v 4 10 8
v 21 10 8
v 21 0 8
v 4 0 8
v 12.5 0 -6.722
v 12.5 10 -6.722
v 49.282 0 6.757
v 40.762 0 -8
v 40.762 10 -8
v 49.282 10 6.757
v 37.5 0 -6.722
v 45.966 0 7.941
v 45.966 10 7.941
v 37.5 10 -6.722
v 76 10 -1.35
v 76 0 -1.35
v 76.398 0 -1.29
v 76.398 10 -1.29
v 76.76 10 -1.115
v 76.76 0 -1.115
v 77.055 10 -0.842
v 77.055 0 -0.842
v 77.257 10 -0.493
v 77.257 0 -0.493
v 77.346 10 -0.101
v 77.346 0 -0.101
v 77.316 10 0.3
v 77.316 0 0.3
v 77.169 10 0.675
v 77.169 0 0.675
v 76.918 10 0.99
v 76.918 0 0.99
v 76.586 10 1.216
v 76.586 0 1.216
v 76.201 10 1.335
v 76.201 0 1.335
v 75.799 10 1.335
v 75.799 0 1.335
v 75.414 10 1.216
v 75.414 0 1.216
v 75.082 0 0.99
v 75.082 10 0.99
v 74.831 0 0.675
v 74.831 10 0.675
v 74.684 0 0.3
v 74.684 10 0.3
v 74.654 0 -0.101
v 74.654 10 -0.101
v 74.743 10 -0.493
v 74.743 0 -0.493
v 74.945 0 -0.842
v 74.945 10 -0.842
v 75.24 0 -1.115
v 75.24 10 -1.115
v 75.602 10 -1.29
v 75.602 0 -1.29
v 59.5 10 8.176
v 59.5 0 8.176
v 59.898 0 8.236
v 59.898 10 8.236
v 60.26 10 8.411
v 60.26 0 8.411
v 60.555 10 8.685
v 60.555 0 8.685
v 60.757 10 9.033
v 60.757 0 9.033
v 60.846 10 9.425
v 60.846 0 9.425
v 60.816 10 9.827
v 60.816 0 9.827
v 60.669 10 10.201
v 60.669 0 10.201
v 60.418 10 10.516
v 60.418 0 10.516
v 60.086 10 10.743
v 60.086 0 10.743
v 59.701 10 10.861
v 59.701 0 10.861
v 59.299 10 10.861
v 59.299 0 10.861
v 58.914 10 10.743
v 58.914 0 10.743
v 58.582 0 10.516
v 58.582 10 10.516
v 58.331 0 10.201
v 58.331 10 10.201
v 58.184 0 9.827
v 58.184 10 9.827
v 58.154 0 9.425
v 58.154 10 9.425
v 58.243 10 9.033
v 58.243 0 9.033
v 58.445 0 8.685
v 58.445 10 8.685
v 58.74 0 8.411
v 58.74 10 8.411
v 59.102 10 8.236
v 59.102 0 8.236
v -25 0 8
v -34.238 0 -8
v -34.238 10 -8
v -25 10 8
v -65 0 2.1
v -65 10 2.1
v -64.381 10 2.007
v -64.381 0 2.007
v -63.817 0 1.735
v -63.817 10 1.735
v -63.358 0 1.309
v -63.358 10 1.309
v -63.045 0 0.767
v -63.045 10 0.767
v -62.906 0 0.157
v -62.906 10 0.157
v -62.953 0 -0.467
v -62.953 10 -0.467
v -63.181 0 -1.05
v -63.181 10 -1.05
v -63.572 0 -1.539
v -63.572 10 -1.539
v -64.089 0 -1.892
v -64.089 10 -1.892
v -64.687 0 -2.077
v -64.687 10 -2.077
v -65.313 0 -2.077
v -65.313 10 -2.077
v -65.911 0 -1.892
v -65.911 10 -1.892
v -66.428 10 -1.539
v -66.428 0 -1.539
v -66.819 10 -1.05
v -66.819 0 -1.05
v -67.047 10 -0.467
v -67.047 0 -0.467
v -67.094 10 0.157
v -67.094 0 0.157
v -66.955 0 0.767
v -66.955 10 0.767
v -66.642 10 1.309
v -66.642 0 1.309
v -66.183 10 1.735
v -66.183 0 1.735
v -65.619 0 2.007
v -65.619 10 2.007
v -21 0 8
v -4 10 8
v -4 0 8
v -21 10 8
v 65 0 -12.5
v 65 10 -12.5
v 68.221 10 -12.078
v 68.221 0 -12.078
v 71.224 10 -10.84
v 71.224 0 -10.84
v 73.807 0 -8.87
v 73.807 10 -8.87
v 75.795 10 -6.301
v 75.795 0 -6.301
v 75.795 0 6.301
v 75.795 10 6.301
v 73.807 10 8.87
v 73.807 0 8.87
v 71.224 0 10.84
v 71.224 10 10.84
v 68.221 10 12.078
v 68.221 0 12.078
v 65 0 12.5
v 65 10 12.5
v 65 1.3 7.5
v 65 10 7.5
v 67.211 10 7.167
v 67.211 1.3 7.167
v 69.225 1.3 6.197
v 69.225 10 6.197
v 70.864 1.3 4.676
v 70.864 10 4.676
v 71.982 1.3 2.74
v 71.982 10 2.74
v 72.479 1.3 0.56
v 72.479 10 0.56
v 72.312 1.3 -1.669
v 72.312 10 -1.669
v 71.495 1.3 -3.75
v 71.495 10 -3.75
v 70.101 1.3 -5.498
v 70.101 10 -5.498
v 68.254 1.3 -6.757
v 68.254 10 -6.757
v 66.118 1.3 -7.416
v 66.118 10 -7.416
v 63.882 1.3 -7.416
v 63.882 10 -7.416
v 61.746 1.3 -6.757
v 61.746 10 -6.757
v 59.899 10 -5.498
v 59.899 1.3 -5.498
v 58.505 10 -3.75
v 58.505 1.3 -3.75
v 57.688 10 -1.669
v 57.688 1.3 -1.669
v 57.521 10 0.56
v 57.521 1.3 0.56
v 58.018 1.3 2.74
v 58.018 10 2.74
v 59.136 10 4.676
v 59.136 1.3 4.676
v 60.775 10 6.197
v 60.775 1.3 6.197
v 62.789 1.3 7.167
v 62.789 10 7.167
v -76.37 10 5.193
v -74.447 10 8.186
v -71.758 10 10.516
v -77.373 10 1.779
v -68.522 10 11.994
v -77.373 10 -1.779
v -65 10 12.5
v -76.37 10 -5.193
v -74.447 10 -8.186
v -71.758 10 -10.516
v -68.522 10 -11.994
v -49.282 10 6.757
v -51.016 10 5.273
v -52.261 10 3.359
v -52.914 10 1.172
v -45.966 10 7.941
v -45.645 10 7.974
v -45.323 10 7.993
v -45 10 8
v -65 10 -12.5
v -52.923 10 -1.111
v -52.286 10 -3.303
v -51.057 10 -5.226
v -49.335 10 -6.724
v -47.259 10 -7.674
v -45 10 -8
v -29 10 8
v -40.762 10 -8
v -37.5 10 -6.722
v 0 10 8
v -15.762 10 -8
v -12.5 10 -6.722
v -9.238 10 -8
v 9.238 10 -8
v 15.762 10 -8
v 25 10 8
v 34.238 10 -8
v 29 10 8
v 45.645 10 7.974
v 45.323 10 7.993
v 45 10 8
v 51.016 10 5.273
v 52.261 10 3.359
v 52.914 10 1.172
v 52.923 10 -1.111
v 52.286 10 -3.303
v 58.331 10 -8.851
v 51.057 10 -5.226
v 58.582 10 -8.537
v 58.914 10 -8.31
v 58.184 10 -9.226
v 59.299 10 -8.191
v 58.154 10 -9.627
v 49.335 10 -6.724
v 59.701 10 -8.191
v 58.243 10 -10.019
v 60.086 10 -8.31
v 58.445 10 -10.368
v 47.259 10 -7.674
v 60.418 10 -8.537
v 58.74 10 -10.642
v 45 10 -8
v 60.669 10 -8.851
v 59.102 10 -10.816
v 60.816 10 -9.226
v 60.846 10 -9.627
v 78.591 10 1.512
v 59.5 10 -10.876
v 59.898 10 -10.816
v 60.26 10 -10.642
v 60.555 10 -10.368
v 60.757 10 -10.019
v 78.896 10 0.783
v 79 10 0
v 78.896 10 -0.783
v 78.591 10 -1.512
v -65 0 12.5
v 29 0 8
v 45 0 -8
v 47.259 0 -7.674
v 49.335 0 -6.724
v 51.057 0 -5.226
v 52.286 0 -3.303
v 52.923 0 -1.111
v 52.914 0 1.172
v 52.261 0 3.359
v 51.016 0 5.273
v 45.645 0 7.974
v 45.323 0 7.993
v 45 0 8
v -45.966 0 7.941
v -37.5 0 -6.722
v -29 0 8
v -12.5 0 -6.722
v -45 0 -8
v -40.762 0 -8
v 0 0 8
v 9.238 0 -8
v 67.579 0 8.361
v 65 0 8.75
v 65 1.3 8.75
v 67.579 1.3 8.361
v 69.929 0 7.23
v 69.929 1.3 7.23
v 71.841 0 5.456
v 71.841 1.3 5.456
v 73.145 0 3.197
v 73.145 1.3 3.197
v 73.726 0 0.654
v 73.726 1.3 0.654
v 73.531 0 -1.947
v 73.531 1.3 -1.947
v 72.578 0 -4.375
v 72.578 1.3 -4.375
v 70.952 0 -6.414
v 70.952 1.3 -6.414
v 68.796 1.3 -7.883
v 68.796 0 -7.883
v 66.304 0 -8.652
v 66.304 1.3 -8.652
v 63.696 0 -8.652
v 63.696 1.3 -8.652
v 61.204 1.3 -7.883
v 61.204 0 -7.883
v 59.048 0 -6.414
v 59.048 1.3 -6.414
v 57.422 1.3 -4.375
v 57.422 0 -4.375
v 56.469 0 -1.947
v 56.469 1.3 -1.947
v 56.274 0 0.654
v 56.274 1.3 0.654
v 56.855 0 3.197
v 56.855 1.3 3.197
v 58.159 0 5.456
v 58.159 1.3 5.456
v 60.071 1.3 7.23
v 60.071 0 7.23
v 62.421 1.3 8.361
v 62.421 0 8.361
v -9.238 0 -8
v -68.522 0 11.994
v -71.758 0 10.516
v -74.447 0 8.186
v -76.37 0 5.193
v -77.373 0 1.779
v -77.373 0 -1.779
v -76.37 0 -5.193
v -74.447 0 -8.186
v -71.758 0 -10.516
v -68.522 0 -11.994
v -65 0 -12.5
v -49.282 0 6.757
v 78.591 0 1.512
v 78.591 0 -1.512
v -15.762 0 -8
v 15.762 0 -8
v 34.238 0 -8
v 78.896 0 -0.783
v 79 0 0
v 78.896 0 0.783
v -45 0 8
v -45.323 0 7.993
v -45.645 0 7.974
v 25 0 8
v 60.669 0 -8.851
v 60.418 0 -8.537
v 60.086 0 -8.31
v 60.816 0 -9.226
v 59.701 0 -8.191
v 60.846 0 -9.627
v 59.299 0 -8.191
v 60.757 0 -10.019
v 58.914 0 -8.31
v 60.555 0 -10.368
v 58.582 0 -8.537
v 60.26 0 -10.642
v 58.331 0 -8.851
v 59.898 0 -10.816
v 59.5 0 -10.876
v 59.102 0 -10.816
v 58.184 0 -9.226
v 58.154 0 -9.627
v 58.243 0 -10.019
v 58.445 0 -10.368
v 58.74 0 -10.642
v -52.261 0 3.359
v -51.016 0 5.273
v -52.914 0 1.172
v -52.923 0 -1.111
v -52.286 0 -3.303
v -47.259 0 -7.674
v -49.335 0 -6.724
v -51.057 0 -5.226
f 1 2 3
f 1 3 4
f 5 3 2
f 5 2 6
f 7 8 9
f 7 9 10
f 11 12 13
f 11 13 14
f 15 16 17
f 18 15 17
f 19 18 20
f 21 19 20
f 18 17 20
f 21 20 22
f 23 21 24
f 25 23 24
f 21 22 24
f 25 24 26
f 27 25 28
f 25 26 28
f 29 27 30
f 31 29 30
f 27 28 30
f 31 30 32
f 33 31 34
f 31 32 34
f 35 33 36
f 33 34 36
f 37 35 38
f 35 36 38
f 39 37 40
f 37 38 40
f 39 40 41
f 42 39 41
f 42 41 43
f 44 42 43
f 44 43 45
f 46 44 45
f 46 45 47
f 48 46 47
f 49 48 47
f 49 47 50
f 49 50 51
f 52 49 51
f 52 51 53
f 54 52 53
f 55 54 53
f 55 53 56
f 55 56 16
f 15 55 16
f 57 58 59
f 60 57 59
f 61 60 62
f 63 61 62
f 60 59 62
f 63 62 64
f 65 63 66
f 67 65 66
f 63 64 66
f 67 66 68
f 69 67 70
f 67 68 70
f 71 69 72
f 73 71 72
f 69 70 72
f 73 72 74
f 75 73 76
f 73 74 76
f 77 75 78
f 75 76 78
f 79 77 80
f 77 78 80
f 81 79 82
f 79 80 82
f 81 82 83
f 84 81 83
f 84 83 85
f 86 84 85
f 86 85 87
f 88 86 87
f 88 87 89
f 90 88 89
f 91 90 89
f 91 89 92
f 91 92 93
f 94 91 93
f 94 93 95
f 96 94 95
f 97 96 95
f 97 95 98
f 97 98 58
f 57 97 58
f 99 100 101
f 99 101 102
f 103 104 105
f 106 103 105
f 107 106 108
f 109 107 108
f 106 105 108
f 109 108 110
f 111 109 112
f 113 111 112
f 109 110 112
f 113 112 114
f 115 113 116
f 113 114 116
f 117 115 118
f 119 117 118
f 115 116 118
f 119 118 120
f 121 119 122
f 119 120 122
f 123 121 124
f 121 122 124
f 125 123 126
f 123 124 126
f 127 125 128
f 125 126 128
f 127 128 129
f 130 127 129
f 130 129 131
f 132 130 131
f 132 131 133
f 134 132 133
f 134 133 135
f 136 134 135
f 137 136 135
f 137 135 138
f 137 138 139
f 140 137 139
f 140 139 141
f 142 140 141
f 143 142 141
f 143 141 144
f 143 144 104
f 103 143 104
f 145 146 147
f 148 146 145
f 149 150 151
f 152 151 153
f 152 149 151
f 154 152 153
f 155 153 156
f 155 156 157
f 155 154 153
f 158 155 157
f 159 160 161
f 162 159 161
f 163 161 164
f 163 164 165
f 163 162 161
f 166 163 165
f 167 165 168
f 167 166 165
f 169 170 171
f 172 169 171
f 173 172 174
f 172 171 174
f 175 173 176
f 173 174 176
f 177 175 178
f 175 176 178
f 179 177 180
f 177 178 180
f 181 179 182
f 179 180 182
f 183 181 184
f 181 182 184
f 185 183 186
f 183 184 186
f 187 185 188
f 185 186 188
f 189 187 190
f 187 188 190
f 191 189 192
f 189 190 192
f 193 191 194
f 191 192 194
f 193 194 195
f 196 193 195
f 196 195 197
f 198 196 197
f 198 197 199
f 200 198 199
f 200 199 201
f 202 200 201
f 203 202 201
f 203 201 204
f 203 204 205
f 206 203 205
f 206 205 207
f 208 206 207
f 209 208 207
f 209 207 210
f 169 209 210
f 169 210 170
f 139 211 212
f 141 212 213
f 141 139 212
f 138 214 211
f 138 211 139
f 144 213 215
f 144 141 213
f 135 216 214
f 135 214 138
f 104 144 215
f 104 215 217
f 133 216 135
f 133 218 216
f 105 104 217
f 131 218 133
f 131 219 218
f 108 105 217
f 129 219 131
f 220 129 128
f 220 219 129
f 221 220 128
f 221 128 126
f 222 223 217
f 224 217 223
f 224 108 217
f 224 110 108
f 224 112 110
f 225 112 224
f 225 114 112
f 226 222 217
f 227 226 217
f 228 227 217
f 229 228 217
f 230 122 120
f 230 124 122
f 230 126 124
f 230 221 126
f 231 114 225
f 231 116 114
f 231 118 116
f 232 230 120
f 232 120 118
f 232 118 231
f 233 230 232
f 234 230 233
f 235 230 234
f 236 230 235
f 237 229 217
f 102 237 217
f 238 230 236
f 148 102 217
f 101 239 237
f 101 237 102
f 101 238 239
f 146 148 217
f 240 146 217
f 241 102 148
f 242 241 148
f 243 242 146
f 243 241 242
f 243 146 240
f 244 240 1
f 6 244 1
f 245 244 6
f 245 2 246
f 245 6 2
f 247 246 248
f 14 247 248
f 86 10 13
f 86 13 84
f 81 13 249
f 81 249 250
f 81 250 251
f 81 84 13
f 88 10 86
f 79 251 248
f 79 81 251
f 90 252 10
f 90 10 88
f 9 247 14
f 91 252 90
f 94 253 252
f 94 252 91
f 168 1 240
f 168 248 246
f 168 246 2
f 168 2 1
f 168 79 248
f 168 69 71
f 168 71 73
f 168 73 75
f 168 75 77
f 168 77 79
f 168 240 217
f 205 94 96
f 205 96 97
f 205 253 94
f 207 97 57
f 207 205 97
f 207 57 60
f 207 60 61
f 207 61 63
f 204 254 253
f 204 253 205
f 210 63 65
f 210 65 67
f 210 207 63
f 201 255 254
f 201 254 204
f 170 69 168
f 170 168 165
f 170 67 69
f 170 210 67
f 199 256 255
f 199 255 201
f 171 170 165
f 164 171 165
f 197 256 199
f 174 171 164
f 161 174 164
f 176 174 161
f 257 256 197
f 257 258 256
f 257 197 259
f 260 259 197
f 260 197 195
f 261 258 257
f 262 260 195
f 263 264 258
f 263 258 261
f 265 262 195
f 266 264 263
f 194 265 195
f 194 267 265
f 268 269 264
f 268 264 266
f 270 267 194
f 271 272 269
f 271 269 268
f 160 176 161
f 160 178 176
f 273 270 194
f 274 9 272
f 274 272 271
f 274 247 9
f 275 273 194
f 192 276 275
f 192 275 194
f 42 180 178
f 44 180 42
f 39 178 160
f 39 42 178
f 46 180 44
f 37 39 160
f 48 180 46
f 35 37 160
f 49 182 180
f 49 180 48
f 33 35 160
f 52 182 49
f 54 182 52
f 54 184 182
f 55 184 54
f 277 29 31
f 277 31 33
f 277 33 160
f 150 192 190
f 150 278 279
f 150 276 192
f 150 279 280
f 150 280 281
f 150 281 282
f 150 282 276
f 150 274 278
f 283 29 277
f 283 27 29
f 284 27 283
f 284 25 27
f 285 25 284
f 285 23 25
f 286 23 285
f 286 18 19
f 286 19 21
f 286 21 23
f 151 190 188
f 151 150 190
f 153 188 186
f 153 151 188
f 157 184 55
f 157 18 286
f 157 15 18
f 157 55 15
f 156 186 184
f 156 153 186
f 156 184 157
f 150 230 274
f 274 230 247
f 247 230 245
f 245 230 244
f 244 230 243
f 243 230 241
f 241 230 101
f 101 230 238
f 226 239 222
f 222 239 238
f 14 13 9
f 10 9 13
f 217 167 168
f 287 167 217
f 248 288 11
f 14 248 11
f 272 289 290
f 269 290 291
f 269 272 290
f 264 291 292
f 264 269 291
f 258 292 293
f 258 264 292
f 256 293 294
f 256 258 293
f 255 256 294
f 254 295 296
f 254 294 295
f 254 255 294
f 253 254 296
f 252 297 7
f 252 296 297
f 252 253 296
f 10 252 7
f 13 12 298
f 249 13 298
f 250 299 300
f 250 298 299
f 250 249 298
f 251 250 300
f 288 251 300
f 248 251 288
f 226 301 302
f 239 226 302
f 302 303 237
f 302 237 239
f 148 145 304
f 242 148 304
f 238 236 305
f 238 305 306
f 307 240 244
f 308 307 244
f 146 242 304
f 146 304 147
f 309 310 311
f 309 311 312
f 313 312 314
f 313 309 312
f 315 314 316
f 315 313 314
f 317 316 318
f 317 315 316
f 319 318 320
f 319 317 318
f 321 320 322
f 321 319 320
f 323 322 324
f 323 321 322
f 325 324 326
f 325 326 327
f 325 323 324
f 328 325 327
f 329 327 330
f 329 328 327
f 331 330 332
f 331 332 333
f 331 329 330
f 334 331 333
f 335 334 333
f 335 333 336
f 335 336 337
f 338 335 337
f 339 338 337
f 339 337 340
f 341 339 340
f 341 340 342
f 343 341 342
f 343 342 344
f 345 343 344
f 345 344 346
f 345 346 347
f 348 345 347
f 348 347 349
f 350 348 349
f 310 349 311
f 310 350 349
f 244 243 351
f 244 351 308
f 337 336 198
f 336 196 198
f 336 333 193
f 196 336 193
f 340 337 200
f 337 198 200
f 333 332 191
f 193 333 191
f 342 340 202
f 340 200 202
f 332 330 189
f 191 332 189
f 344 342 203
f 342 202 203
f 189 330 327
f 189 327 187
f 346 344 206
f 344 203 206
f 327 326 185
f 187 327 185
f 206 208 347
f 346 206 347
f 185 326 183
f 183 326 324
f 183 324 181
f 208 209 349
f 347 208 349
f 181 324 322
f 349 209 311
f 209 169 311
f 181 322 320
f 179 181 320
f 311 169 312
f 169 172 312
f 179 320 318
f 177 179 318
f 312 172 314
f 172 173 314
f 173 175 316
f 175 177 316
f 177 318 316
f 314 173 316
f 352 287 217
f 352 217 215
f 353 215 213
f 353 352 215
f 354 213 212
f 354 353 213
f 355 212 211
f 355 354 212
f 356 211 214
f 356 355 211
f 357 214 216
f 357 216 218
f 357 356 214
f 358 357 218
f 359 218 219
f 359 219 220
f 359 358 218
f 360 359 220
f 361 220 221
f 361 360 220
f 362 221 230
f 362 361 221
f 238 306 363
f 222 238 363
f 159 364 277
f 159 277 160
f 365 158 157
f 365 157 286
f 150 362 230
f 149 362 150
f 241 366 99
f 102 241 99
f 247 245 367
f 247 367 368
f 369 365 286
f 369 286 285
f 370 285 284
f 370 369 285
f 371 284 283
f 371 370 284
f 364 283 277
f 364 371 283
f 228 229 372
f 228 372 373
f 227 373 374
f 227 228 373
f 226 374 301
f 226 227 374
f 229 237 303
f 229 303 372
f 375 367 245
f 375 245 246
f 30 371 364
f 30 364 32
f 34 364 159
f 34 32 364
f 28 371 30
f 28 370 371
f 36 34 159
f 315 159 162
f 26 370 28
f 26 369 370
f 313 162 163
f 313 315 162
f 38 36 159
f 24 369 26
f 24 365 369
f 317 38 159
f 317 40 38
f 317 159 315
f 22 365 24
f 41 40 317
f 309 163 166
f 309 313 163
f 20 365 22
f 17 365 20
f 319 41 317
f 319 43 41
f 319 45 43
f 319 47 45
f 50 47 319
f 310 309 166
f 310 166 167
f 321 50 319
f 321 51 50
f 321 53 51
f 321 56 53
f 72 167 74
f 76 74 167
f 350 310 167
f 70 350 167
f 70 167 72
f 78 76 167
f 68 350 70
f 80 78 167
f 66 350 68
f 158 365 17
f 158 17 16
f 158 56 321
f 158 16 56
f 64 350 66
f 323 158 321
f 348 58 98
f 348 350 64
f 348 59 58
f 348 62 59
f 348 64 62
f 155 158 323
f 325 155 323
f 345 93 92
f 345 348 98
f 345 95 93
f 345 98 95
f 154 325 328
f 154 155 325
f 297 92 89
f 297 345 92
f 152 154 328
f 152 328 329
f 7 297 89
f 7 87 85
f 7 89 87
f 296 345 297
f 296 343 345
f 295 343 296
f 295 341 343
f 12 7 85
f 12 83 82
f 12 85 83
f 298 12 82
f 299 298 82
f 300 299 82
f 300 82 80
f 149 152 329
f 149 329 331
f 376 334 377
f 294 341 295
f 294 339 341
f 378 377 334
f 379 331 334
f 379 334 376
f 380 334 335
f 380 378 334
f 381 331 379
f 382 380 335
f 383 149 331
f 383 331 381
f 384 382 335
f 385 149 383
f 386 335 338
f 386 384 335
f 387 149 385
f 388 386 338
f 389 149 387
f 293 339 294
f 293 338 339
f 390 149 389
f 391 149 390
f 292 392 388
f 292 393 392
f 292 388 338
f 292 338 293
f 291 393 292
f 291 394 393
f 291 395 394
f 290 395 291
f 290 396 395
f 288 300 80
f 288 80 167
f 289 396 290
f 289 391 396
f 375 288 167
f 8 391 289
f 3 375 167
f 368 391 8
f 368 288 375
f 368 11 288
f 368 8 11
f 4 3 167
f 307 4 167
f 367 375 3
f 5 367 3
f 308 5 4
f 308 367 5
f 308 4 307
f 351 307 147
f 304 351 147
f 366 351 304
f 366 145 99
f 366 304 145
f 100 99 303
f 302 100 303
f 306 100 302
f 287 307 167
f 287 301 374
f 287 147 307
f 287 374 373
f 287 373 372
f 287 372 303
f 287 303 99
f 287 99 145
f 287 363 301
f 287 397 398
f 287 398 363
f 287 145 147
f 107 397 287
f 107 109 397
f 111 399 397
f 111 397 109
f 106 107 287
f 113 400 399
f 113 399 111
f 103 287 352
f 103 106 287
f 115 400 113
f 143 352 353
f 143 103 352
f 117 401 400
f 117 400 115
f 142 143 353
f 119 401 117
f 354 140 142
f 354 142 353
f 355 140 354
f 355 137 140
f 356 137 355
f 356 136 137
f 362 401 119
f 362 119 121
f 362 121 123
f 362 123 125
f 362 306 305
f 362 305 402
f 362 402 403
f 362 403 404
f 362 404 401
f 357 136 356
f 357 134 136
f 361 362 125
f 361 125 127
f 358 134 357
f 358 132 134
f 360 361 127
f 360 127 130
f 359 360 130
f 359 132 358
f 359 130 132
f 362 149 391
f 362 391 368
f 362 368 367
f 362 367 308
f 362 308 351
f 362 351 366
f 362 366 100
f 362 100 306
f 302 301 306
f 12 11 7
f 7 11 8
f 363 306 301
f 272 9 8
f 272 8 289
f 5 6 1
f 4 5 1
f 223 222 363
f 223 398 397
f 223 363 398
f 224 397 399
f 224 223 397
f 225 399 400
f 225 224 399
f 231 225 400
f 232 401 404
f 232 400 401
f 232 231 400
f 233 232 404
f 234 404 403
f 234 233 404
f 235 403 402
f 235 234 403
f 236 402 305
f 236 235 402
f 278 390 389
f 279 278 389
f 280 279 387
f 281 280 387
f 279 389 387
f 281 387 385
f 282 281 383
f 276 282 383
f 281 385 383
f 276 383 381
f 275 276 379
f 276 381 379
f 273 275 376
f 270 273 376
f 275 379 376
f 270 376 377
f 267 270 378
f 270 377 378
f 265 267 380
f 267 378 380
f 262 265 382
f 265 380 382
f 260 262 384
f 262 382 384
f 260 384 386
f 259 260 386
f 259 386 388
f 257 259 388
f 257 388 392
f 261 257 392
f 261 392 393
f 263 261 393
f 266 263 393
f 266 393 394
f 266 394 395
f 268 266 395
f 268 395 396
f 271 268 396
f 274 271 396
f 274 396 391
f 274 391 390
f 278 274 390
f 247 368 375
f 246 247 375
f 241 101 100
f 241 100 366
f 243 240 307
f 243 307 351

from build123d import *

# Parameters (mm, degrees)
EXTRUDE_1_DEPTH        = 10
EXTRUDE_5_DEPTH        = 10
CUT_EXTRUDE_2_REACH    = 82.606
SKETCH_7_R             = 7.5
SKETCH_8_R             = 8.75
CUT_EXTRUDE_3_DEPTH    = 1.3
CUT_EXTRUDE_4_REACH    = 82.606
SKETCH_9_R             = 1.35
CUT_EXTRUDE_5_REACH    = 82.606
SKETCH_12_R            = 2.1
CUT_EXTRUDE_6_REACH    = 82.606
EXTRUDE_6_DEPTH        = 10
PATTERN_LINEAR_1_DEPTH = 10


# Read off the part's stored shape, not the designer's step: 阵列(线性)1
with BuildPart() as part:
    # 草图1 → 凸台-拉伸1 (new body)
    with BuildSketch(Plane(origin=(0, 0, 0), x_dir=(1, 0, 0), z_dir=(0, 1, 0))):
        with BuildLine():
            Line((-65, 12.5), (65, 12.5))
            ThreePointArc((65, 12.5), (77.5, 0), (65, -12.5))
            Line((65, -12.5), (-65, -12.5))
            ThreePointArc((-65, -12.5), (-77.5, 0), (-65, 12.5))
        make_face()
    extrude(amount=EXTRUDE_1_DEPTH)

    # 草图10 → 凸台-拉伸5 (add)
    with BuildSketch(Plane.XZ):
        with BuildLine():
            Line((75.795454545, -6.301441197), (78.590909091, -1.512345887))
            ThreePointArc((78.590909091, -1.512345887), (79, 0), (78.590909091, 1.512345887))
            Line((78.590909091, 1.512345887), (75.795454545, 6.301441197))
            Line((75.795454545, 6.301441197), (75.795454545, -6.301441197))
        make_face()
    extrude(amount=-EXTRUDE_5_DEPTH)

    # 草图7 → 切除-拉伸2 (cut, up to next)
    with BuildSketch(Plane(origin=(0, 10, 0), x_dir=(1, 0, 0), z_dir=(0, 1, 0)), mode=Mode.PRIVATE) as cut_extrude_2_sk1:
        with Locations(Location((65, 0, 0), (0, 0, 270))):
            Circle(SKETCH_7_R)
    cut_extrude_2_tool1 = extrude(cut_extrude_2_sk1.sketch, amount=-CUT_EXTRUDE_2_REACH, mode=Mode.PRIVATE) & part.part
    add(cut_extrude_2_tool1.solids().sort_by_distance((65, 10, 0))[0], mode=Mode.SUBTRACT)

    # 草图8 → 切除-拉伸3 (cut)
    with BuildSketch(Plane(origin=(0, 0, 0), x_dir=(1, 0, 0), z_dir=(0, 1, 0))):
        with Locations(Location((65, 0, 0), (0, 0, 270))):
            Circle(SKETCH_8_R)
    extrude(amount=CUT_EXTRUDE_3_DEPTH, mode=Mode.SUBTRACT)

    # 草图9 → 切除-拉伸4 (cut, up to next)
    with BuildSketch(Plane.XZ, mode=Mode.PRIVATE) as cut_extrude_4_sk1:
        with Locations(Location((59.5, 9.526279442, 0), (0, 0, 270))):
            Circle(SKETCH_9_R)
    cut_extrude_4_tool1 = extrude(cut_extrude_4_sk1.sketch, amount=-CUT_EXTRUDE_4_REACH, mode=Mode.PRIVATE) & part.part
    # 草图9 → 切除-拉伸4 (cut, up to next)
    with BuildSketch(Plane.XZ, mode=Mode.PRIVATE) as cut_extrude_4_sk2:
        with Locations(Location((76, 0, 0), (0, 0, 270))):
            Circle(SKETCH_9_R)
    cut_extrude_4_tool2 = extrude(cut_extrude_4_sk2.sketch, amount=-CUT_EXTRUDE_4_REACH, mode=Mode.PRIVATE) & part.part
    # 草图9 → 切除-拉伸4 (cut, up to next)
    with BuildSketch(Plane.XZ, mode=Mode.PRIVATE) as cut_extrude_4_sk3:
        with Locations(Location((59.5, -9.526279442, 0), (0, 0, 270))):
            Circle(SKETCH_9_R)
    cut_extrude_4_tool3 = extrude(cut_extrude_4_sk3.sketch, amount=-CUT_EXTRUDE_4_REACH, mode=Mode.PRIVATE) & part.part
    add(cut_extrude_4_tool1.solids().sort_by_distance((59.5, 0, 9.526279))[0], mode=Mode.SUBTRACT)
    add(cut_extrude_4_tool2.solids().sort_by_distance((76, 0, 0))[0], mode=Mode.SUBTRACT)
    add(cut_extrude_4_tool3.solids().sort_by_distance((59.5, 0, -9.526279))[0], mode=Mode.SUBTRACT)

    # 草图12 → 切除-拉伸5 (cut, up to next)
    with BuildSketch(Plane(origin=(0, 10, 0), x_dir=(1, 0, 0), z_dir=(0, 1, 0)), mode=Mode.PRIVATE) as cut_extrude_5_sk1:
        with Locations(Location((-65, 0, 0), (0, 0, 270))):
            Circle(SKETCH_12_R)
    cut_extrude_5_tool1 = extrude(cut_extrude_5_sk1.sketch, amount=-CUT_EXTRUDE_5_REACH, mode=Mode.PRIVATE) & part.part
    add(cut_extrude_5_tool1.solids().sort_by_distance((-65, 10, 0))[0], mode=Mode.SUBTRACT)

    # 草图13 → 切除-拉伸6 (cut, up to next)
    with BuildSketch(Plane(origin=(0, 10, 0), x_dir=(1, 0, 0), z_dir=(0, 1, 0)), mode=Mode.PRIVATE) as cut_extrude_6_sk1:
        with BuildLine():
            Line((-45, 8), (45, 8))
            ThreePointArc((45, 8), (53, 0), (45, -8))
            Line((45, -8), (-45, -8))
            ThreePointArc((-45, -8), (-53, 0), (-45, 8))
        make_face()
    cut_extrude_6_tool1 = extrude(cut_extrude_6_sk1.sketch, amount=-CUT_EXTRUDE_6_REACH, mode=Mode.PRIVATE) & part.part
    add(cut_extrude_6_tool1.solids().sort_by_distance((0, 10, 0))[0], mode=Mode.SUBTRACT)

    # 草图14 → 凸台-拉伸6 (add)
    with BuildSketch(Plane(origin=(0, 10, 0), x_dir=(1, 0, 0), z_dir=(0, 1, 0))):
        Polygon((0, -8), (9.237604307, 8), (13.237604307, 8), (4, -8), align=None)
    extrude_6 = extrude(amount=-EXTRUDE_6_DEPTH)

    # 阵列(线性)1 outline → 阵列(线性)1 (add)
    with BuildSketch(Plane(origin=(0, 0, 0), x_dir=(1, 0, 0), z_dir=(0, 1, 0))):
        Polygon((38.237604307, 8), (34.237604307, 8), (25, -8), (29, -8), align=None)
        Polygon((-11.762395693, 8), (-15.762395693, 8), (-25, -8), (-21, -8), align=None)
        with BuildLine():
            Line((-45.966190603, -7.941440406), (-36.762395693, 8))
            Line((-36.762395693, 8), (-40.762395693, 8))
            Line((-40.762395693, 8), (-49.282491188, -6.757238284))
            ThreePointArc((-49.282491188, -6.757238284), (-47.690306451, -7.534072683), (-45.966190603, -7.941440406))
        make_face()
    pattern_linear_1 = extrude(amount=PATTERN_LINEAR_1_DEPTH)

    # 镜向1: 凸台-拉伸6, 阵列(线性)1 across plane
    add(extrude_6.mirror(Plane(origin=(0, 0, 0), x_dir=(0, 0, 1), z_dir=(1, 0, 0))))
    add(pattern_linear_1.mirror(Plane(origin=(0, 0, 0), x_dir=(0, 0, 1), z_dir=(1, 0, 0))))


solid = part.part
